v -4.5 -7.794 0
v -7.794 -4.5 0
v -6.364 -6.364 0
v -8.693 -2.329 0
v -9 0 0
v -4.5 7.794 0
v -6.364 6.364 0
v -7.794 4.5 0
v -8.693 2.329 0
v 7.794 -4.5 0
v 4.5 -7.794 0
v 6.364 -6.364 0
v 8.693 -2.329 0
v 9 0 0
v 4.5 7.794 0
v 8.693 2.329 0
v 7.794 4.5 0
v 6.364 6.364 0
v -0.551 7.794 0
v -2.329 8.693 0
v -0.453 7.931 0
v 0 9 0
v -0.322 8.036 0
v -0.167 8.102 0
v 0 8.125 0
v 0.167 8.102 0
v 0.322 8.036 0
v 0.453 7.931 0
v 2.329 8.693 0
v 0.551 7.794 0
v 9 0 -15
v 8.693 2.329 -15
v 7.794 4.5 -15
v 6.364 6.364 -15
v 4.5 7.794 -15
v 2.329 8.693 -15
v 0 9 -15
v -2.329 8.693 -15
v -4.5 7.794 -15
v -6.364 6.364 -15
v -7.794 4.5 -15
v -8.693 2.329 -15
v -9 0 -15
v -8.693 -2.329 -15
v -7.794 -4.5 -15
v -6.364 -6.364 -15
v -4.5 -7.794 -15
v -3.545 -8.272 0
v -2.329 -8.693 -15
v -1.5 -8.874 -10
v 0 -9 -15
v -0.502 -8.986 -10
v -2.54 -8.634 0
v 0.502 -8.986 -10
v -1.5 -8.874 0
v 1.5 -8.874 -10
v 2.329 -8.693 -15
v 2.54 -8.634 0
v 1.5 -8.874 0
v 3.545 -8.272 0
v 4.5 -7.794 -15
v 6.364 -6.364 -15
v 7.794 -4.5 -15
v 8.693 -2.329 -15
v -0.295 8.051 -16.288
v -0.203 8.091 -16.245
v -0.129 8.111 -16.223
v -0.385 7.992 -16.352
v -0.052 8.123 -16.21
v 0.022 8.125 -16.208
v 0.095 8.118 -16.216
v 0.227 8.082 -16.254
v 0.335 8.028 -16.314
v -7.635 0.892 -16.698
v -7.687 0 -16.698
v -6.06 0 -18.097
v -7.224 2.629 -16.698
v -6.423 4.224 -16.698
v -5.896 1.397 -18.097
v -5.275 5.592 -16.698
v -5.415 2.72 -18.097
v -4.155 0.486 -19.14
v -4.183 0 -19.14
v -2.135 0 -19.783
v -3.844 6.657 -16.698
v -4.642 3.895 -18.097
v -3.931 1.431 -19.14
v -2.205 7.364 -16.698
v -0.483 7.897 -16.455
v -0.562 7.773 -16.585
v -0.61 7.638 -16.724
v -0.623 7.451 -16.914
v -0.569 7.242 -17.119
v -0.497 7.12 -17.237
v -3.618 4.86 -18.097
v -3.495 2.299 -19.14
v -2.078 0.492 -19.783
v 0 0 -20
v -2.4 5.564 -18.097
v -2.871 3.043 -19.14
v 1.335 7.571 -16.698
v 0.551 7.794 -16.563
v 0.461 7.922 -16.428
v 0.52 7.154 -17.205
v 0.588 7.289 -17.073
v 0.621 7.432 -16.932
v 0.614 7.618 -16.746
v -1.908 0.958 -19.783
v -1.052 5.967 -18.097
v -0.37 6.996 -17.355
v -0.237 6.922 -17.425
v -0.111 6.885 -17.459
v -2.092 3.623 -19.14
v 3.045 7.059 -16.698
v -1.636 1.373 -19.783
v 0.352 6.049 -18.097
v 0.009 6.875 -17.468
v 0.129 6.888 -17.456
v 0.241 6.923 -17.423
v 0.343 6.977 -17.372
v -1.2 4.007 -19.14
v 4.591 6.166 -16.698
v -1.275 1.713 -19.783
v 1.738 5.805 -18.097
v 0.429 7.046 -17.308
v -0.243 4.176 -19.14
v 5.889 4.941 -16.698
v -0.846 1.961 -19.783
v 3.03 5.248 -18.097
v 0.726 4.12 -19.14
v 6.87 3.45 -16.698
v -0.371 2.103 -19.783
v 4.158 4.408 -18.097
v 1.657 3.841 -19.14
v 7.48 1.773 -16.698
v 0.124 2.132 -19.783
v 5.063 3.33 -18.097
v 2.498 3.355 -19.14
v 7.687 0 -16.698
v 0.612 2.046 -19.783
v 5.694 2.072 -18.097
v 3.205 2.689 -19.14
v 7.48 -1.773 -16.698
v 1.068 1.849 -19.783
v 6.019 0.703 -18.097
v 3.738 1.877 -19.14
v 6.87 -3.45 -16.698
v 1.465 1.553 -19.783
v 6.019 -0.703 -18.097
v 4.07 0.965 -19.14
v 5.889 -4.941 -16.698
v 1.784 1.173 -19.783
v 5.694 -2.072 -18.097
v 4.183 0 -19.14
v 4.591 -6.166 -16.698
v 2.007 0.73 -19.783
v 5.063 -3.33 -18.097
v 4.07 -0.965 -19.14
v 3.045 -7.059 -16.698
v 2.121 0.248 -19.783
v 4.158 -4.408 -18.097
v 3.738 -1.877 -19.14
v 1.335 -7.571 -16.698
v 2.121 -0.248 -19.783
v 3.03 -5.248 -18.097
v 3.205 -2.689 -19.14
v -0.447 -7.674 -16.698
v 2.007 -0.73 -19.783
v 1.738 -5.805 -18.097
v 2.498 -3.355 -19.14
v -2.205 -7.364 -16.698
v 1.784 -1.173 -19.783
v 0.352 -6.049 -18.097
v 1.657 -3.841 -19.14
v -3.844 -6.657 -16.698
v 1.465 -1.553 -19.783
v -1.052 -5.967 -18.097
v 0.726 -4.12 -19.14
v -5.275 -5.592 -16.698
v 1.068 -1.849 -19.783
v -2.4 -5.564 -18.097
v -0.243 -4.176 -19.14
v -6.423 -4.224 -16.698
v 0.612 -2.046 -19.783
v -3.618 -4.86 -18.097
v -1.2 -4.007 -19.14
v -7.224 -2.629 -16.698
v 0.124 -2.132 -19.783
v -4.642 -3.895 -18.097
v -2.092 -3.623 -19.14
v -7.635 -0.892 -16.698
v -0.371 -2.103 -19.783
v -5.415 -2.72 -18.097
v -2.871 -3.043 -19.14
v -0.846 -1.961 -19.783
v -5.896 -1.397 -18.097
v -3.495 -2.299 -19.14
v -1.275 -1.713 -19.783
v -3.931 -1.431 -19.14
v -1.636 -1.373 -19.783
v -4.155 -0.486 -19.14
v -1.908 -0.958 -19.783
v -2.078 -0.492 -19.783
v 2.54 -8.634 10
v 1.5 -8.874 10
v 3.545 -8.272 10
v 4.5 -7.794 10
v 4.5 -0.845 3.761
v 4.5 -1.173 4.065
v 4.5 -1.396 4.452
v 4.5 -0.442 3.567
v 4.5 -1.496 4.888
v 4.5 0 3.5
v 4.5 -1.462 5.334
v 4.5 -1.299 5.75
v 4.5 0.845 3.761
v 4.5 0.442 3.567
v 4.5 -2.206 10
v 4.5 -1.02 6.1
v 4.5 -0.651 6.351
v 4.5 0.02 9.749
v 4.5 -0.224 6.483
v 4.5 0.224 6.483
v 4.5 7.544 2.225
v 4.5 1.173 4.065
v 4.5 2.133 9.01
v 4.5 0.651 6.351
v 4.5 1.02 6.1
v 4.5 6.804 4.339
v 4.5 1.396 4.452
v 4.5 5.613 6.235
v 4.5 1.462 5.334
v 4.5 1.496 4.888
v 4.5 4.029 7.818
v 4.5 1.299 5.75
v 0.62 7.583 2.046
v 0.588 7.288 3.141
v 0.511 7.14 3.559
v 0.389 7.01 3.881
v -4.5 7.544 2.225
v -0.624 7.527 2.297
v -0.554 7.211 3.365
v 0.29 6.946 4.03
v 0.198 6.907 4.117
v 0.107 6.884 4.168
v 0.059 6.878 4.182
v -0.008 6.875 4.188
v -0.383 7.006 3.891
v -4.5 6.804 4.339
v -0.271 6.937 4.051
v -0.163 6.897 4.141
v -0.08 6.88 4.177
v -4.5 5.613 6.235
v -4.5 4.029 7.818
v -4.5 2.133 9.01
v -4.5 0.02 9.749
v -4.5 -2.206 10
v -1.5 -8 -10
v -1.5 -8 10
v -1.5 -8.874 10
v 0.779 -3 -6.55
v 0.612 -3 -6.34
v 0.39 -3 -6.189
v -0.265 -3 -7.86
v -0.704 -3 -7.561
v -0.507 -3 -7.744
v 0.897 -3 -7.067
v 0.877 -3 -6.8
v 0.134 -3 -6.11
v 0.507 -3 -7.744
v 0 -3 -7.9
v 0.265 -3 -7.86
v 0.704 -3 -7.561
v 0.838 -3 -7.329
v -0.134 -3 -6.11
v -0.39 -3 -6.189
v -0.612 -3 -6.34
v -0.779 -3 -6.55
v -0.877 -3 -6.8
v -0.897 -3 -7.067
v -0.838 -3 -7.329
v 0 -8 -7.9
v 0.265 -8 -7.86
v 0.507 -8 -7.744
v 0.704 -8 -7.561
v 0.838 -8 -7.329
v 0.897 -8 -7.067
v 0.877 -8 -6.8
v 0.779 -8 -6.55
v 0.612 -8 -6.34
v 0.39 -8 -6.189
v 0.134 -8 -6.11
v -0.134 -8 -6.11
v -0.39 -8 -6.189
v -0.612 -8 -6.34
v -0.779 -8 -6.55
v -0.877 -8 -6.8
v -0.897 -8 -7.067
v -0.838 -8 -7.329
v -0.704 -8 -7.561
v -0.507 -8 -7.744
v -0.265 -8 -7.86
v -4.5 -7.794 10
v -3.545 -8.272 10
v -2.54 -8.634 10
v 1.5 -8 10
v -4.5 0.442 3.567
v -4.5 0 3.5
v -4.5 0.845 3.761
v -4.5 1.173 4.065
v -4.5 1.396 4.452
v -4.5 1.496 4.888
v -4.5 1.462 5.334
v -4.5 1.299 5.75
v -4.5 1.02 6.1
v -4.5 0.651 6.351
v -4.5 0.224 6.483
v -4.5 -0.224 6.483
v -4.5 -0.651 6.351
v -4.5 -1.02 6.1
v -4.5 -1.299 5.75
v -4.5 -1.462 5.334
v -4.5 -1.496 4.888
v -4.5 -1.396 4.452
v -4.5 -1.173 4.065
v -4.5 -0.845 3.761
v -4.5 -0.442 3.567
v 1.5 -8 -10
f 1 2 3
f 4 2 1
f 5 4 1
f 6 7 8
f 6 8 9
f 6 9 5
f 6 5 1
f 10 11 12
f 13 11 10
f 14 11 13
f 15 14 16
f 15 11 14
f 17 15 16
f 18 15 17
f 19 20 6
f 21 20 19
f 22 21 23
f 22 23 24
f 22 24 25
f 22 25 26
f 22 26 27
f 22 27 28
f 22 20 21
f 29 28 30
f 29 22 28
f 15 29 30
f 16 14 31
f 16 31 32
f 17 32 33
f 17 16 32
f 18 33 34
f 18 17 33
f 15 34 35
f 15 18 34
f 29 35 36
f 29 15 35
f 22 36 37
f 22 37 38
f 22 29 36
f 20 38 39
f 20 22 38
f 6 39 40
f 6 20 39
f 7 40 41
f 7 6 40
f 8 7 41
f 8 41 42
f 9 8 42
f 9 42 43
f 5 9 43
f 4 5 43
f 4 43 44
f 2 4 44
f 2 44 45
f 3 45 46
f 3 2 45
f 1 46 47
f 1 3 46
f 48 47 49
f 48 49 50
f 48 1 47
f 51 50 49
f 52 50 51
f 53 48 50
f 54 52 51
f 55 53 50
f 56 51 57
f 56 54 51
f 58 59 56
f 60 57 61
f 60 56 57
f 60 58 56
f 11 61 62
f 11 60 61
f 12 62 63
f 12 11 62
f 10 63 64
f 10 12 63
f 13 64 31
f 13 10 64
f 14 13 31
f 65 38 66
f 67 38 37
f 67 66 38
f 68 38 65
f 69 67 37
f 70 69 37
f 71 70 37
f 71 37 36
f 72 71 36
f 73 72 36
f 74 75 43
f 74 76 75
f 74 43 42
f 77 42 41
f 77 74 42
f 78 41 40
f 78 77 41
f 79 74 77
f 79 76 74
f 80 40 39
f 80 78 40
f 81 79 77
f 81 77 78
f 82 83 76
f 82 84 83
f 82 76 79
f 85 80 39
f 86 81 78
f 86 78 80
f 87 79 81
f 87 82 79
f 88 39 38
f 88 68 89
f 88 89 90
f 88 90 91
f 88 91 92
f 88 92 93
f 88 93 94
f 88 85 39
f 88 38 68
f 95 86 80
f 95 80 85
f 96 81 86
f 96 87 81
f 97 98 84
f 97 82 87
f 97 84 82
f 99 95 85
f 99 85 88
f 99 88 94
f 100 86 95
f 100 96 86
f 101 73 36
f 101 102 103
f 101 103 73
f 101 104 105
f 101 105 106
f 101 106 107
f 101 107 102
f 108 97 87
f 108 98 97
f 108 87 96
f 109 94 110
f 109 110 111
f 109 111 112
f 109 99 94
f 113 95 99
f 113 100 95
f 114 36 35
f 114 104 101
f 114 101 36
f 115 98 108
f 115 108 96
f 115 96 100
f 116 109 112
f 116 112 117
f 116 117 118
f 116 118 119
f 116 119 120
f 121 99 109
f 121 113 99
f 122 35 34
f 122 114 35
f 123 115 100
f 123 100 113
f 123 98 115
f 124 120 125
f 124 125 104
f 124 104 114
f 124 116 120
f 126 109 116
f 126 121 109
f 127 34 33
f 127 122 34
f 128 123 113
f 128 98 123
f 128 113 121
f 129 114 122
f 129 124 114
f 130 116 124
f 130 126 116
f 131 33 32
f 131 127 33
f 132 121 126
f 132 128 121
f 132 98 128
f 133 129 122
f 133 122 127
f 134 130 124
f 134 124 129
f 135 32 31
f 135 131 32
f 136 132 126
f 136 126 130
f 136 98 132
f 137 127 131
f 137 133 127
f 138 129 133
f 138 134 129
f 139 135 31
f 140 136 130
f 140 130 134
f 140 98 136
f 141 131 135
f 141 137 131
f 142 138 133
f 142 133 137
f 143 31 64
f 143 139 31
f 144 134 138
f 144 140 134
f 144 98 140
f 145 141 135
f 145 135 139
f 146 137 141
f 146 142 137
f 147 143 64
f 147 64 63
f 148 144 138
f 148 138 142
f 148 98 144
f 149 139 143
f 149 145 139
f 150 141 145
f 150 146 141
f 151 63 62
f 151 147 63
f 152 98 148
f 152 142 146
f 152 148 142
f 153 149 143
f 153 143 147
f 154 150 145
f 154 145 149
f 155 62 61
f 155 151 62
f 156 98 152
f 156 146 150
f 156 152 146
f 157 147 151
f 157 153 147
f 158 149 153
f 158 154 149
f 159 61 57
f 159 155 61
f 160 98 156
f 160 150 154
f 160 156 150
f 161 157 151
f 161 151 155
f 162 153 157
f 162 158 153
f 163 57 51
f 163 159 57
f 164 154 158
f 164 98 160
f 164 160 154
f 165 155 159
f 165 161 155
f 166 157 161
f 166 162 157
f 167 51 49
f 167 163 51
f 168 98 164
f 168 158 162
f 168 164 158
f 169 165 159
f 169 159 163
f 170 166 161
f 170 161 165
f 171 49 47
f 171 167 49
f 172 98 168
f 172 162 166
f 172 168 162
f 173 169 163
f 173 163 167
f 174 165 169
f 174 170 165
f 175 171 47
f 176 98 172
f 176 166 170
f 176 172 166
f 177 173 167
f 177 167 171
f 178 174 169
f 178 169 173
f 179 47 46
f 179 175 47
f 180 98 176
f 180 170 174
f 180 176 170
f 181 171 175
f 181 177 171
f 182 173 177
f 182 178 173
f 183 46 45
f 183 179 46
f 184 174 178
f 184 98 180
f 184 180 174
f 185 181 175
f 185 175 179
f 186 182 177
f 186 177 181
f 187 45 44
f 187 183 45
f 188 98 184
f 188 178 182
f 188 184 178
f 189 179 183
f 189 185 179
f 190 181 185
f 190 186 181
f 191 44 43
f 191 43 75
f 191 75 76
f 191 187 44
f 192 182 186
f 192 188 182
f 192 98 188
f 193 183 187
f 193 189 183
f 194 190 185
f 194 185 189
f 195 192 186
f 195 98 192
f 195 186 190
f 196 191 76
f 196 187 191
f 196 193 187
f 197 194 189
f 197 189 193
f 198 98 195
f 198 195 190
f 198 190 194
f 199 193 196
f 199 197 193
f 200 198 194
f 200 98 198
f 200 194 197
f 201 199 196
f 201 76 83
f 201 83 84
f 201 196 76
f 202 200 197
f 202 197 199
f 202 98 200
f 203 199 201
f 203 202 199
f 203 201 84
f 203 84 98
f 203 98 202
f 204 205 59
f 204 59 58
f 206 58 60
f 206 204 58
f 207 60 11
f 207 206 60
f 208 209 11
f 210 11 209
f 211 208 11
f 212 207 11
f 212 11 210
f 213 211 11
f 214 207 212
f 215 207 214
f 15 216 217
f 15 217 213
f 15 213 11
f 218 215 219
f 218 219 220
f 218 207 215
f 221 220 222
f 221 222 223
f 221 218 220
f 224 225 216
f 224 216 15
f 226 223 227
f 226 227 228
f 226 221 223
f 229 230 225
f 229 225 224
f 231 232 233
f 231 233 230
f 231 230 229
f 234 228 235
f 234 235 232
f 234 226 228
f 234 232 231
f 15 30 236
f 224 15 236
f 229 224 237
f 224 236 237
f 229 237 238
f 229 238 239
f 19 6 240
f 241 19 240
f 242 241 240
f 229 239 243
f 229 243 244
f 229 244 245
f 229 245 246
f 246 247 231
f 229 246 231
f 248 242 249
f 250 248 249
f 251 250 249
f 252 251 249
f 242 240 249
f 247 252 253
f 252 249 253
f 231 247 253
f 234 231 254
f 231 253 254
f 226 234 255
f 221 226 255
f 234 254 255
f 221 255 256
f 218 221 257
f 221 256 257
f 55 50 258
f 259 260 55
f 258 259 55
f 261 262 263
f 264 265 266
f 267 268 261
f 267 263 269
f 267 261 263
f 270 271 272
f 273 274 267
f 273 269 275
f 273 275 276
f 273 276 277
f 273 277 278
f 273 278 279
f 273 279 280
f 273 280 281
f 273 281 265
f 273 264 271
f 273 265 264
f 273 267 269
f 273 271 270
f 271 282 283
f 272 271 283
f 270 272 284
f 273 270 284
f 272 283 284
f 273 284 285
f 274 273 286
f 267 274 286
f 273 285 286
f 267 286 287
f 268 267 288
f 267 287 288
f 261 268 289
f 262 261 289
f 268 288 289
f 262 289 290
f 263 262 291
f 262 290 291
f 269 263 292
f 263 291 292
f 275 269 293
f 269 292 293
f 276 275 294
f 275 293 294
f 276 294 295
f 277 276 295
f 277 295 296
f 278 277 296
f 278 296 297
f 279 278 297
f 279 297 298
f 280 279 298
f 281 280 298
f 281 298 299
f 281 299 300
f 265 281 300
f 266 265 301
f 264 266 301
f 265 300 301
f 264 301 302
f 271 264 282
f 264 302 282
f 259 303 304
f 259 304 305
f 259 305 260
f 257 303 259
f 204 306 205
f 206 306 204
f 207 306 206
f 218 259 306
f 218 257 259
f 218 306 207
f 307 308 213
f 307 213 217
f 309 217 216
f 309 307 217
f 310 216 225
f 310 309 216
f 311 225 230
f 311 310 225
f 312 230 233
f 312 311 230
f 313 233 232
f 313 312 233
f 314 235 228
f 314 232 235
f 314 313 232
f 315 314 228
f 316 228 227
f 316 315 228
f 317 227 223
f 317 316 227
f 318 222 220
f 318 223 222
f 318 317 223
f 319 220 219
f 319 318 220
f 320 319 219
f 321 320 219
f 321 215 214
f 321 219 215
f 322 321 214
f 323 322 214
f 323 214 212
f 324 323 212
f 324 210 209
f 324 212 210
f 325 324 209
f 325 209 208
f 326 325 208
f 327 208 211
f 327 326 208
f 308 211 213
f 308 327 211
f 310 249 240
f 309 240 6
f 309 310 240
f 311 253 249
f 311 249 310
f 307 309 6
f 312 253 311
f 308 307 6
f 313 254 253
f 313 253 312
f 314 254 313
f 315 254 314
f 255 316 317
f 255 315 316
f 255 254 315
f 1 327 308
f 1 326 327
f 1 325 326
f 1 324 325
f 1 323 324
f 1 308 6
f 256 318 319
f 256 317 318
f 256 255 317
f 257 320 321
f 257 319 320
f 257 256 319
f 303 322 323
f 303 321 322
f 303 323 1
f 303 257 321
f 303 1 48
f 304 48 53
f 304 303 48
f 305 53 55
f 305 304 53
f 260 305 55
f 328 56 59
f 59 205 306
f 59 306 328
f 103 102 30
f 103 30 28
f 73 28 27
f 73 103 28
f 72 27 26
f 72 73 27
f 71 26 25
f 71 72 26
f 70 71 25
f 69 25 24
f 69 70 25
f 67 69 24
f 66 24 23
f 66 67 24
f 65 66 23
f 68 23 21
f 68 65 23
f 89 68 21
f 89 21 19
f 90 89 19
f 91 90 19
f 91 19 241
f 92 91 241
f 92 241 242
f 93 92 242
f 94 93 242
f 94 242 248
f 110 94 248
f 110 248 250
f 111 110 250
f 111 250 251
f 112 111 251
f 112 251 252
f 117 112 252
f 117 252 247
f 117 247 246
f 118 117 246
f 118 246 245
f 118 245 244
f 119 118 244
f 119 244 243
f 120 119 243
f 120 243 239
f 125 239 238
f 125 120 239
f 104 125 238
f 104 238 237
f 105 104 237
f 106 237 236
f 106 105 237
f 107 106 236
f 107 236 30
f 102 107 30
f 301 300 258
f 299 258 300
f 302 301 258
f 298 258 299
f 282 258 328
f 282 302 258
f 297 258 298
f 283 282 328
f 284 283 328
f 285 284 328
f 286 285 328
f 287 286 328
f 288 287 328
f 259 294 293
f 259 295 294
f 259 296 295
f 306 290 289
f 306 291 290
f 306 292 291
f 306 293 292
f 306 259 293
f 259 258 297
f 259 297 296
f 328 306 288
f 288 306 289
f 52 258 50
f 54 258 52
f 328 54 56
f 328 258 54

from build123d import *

# Parameters (mm, degrees)
SKETCH1_R               = 9
BOSS_EXTRUDE1_DEPTH     = 15
BOSS_EXTRUDE2_START     = 10
BOSS_EXTRUDE2_DEPTH     = 10
DOME2_FACE_RADIUS       = 9
DOME2_HEIGHT            = 5
CUT_EXTRUDE1_DEPTH      = 24.706539182
CUT_EXTRUDE1_DEPTH_BACK = 24.706539182
SKETCH3_R               = 1.5
FILLET4_R               = 10
CUT_EXTRUDE2_DEPTH      = 24.706539182
CUT_EXTRUDE2_DEPTH_BACK = 24.706539182
SKETCH4_R               = 0.625
SKETCH5_W               = 3
SKETCH5_H               = 2
CUT_EXTRUDE3_DEPTH      = 20
SKETCH6_R               = 0.9
CUT_EXTRUDE4_DEPTH      = 5


with BuildPart() as part:
    # Sketch1 → Boss-Extrude1 (new body)
    with BuildSketch(Plane.XY):
        Circle(SKETCH1_R)
    extrude(amount=-BOSS_EXTRUDE1_DEPTH)

    # Sketch2 → Boss-Extrude2 (add)
    with BuildSketch(Plane.XY.offset(BOSS_EXTRUDE2_START)):
        with BuildLine():
            Line((-4.5, 7.794228634), (-4.5, -7.794228634))
            ThreePointArc((-4.5, -7.794228634), (0, -9), (4.5, -7.794228634))
            Line((4.5, -7.794228634), (4.5, 7.794228634))
            Line((4.5, 7.794228634), (-4.5, 7.794228634))
        make_face()
    extrude(amount=-BOSS_EXTRUDE2_DEPTH)

    # Dome2: a dome of height H over a round flat face of radius A is a cap of a sphere of radius (A * A + H * H) / (2 * H)
    dome2_r = (DOME2_FACE_RADIUS * DOME2_FACE_RADIUS + DOME2_HEIGHT * DOME2_HEIGHT) / (2 * DOME2_HEIGHT)
    dome2_base = Plane((0, 0, -15), z_dir=(0, 0, -1))
    with Locations(dome2_base.offset(DOME2_HEIGHT - dome2_r)):
        dome2_ball = Sphere(dome2_r, mode=Mode.PRIVATE)
    add(split(dome2_ball, bisect_by=dome2_base, keep=Keep.TOP, mode=Mode.PRIVATE))

    # Sketch3 → Cut-Extrude1 (cut, two sides: drawn at the far end of the back side and taken through both)
    with BuildSketch(Plane(origin=(0, 0, 0), x_dir=(0, 0, -1), z_dir=(1, 0, 0)).offset(-CUT_EXTRUDE1_DEPTH_BACK)):
        with Locations((-5, 0)):
            Circle(SKETCH3_R)
    extrude(amount=CUT_EXTRUDE1_DEPTH + CUT_EXTRUDE1_DEPTH_BACK, mode=Mode.SUBTRACT)

    # Fillet4
    fillet4_edges = [part.edges().sort_by_distance(p)[0] for p in [
        (0, 7.794228634, 10),
    ]]
    fillet(fillet4_edges, radius=FILLET4_R - 0.0001)  # a hair under: the kernel refuses the full size

    # Sketch4 → Cut-Extrude2 (cut, two sides: drawn at the far end of the back side and taken through both)
    with BuildSketch(Plane.XY.offset(-CUT_EXTRUDE2_DEPTH_BACK)):
        with Locations(Location((0, 7.5, 0), (0, 0, 28.084018699))):
            Circle(SKETCH4_R)
    extrude(amount=CUT_EXTRUDE2_DEPTH + CUT_EXTRUDE2_DEPTH_BACK, mode=Mode.SUBTRACT)

    # Sketch5 → Cut-Extrude3 (cut)
    with BuildSketch(Plane.XY.offset(10)):
        with Locations((0, -9)):
            Rectangle(SKETCH5_W, SKETCH5_H)
    extrude(amount=-CUT_EXTRUDE3_DEPTH, mode=Mode.SUBTRACT)

    # Sketch6 → Cut-Extrude4 (cut)
    with BuildSketch(Plane(origin=(0, -8, 0), x_dir=(-1, 0, 0), z_dir=(0, -1, 0))):
        with Locations(Location((0, 7, 0), (0, 0, 90))):
            Circle(SKETCH6_R)
    extrude(amount=-CUT_EXTRUDE4_DEPTH, mode=Mode.SUBTRACT)


solid = part.part
